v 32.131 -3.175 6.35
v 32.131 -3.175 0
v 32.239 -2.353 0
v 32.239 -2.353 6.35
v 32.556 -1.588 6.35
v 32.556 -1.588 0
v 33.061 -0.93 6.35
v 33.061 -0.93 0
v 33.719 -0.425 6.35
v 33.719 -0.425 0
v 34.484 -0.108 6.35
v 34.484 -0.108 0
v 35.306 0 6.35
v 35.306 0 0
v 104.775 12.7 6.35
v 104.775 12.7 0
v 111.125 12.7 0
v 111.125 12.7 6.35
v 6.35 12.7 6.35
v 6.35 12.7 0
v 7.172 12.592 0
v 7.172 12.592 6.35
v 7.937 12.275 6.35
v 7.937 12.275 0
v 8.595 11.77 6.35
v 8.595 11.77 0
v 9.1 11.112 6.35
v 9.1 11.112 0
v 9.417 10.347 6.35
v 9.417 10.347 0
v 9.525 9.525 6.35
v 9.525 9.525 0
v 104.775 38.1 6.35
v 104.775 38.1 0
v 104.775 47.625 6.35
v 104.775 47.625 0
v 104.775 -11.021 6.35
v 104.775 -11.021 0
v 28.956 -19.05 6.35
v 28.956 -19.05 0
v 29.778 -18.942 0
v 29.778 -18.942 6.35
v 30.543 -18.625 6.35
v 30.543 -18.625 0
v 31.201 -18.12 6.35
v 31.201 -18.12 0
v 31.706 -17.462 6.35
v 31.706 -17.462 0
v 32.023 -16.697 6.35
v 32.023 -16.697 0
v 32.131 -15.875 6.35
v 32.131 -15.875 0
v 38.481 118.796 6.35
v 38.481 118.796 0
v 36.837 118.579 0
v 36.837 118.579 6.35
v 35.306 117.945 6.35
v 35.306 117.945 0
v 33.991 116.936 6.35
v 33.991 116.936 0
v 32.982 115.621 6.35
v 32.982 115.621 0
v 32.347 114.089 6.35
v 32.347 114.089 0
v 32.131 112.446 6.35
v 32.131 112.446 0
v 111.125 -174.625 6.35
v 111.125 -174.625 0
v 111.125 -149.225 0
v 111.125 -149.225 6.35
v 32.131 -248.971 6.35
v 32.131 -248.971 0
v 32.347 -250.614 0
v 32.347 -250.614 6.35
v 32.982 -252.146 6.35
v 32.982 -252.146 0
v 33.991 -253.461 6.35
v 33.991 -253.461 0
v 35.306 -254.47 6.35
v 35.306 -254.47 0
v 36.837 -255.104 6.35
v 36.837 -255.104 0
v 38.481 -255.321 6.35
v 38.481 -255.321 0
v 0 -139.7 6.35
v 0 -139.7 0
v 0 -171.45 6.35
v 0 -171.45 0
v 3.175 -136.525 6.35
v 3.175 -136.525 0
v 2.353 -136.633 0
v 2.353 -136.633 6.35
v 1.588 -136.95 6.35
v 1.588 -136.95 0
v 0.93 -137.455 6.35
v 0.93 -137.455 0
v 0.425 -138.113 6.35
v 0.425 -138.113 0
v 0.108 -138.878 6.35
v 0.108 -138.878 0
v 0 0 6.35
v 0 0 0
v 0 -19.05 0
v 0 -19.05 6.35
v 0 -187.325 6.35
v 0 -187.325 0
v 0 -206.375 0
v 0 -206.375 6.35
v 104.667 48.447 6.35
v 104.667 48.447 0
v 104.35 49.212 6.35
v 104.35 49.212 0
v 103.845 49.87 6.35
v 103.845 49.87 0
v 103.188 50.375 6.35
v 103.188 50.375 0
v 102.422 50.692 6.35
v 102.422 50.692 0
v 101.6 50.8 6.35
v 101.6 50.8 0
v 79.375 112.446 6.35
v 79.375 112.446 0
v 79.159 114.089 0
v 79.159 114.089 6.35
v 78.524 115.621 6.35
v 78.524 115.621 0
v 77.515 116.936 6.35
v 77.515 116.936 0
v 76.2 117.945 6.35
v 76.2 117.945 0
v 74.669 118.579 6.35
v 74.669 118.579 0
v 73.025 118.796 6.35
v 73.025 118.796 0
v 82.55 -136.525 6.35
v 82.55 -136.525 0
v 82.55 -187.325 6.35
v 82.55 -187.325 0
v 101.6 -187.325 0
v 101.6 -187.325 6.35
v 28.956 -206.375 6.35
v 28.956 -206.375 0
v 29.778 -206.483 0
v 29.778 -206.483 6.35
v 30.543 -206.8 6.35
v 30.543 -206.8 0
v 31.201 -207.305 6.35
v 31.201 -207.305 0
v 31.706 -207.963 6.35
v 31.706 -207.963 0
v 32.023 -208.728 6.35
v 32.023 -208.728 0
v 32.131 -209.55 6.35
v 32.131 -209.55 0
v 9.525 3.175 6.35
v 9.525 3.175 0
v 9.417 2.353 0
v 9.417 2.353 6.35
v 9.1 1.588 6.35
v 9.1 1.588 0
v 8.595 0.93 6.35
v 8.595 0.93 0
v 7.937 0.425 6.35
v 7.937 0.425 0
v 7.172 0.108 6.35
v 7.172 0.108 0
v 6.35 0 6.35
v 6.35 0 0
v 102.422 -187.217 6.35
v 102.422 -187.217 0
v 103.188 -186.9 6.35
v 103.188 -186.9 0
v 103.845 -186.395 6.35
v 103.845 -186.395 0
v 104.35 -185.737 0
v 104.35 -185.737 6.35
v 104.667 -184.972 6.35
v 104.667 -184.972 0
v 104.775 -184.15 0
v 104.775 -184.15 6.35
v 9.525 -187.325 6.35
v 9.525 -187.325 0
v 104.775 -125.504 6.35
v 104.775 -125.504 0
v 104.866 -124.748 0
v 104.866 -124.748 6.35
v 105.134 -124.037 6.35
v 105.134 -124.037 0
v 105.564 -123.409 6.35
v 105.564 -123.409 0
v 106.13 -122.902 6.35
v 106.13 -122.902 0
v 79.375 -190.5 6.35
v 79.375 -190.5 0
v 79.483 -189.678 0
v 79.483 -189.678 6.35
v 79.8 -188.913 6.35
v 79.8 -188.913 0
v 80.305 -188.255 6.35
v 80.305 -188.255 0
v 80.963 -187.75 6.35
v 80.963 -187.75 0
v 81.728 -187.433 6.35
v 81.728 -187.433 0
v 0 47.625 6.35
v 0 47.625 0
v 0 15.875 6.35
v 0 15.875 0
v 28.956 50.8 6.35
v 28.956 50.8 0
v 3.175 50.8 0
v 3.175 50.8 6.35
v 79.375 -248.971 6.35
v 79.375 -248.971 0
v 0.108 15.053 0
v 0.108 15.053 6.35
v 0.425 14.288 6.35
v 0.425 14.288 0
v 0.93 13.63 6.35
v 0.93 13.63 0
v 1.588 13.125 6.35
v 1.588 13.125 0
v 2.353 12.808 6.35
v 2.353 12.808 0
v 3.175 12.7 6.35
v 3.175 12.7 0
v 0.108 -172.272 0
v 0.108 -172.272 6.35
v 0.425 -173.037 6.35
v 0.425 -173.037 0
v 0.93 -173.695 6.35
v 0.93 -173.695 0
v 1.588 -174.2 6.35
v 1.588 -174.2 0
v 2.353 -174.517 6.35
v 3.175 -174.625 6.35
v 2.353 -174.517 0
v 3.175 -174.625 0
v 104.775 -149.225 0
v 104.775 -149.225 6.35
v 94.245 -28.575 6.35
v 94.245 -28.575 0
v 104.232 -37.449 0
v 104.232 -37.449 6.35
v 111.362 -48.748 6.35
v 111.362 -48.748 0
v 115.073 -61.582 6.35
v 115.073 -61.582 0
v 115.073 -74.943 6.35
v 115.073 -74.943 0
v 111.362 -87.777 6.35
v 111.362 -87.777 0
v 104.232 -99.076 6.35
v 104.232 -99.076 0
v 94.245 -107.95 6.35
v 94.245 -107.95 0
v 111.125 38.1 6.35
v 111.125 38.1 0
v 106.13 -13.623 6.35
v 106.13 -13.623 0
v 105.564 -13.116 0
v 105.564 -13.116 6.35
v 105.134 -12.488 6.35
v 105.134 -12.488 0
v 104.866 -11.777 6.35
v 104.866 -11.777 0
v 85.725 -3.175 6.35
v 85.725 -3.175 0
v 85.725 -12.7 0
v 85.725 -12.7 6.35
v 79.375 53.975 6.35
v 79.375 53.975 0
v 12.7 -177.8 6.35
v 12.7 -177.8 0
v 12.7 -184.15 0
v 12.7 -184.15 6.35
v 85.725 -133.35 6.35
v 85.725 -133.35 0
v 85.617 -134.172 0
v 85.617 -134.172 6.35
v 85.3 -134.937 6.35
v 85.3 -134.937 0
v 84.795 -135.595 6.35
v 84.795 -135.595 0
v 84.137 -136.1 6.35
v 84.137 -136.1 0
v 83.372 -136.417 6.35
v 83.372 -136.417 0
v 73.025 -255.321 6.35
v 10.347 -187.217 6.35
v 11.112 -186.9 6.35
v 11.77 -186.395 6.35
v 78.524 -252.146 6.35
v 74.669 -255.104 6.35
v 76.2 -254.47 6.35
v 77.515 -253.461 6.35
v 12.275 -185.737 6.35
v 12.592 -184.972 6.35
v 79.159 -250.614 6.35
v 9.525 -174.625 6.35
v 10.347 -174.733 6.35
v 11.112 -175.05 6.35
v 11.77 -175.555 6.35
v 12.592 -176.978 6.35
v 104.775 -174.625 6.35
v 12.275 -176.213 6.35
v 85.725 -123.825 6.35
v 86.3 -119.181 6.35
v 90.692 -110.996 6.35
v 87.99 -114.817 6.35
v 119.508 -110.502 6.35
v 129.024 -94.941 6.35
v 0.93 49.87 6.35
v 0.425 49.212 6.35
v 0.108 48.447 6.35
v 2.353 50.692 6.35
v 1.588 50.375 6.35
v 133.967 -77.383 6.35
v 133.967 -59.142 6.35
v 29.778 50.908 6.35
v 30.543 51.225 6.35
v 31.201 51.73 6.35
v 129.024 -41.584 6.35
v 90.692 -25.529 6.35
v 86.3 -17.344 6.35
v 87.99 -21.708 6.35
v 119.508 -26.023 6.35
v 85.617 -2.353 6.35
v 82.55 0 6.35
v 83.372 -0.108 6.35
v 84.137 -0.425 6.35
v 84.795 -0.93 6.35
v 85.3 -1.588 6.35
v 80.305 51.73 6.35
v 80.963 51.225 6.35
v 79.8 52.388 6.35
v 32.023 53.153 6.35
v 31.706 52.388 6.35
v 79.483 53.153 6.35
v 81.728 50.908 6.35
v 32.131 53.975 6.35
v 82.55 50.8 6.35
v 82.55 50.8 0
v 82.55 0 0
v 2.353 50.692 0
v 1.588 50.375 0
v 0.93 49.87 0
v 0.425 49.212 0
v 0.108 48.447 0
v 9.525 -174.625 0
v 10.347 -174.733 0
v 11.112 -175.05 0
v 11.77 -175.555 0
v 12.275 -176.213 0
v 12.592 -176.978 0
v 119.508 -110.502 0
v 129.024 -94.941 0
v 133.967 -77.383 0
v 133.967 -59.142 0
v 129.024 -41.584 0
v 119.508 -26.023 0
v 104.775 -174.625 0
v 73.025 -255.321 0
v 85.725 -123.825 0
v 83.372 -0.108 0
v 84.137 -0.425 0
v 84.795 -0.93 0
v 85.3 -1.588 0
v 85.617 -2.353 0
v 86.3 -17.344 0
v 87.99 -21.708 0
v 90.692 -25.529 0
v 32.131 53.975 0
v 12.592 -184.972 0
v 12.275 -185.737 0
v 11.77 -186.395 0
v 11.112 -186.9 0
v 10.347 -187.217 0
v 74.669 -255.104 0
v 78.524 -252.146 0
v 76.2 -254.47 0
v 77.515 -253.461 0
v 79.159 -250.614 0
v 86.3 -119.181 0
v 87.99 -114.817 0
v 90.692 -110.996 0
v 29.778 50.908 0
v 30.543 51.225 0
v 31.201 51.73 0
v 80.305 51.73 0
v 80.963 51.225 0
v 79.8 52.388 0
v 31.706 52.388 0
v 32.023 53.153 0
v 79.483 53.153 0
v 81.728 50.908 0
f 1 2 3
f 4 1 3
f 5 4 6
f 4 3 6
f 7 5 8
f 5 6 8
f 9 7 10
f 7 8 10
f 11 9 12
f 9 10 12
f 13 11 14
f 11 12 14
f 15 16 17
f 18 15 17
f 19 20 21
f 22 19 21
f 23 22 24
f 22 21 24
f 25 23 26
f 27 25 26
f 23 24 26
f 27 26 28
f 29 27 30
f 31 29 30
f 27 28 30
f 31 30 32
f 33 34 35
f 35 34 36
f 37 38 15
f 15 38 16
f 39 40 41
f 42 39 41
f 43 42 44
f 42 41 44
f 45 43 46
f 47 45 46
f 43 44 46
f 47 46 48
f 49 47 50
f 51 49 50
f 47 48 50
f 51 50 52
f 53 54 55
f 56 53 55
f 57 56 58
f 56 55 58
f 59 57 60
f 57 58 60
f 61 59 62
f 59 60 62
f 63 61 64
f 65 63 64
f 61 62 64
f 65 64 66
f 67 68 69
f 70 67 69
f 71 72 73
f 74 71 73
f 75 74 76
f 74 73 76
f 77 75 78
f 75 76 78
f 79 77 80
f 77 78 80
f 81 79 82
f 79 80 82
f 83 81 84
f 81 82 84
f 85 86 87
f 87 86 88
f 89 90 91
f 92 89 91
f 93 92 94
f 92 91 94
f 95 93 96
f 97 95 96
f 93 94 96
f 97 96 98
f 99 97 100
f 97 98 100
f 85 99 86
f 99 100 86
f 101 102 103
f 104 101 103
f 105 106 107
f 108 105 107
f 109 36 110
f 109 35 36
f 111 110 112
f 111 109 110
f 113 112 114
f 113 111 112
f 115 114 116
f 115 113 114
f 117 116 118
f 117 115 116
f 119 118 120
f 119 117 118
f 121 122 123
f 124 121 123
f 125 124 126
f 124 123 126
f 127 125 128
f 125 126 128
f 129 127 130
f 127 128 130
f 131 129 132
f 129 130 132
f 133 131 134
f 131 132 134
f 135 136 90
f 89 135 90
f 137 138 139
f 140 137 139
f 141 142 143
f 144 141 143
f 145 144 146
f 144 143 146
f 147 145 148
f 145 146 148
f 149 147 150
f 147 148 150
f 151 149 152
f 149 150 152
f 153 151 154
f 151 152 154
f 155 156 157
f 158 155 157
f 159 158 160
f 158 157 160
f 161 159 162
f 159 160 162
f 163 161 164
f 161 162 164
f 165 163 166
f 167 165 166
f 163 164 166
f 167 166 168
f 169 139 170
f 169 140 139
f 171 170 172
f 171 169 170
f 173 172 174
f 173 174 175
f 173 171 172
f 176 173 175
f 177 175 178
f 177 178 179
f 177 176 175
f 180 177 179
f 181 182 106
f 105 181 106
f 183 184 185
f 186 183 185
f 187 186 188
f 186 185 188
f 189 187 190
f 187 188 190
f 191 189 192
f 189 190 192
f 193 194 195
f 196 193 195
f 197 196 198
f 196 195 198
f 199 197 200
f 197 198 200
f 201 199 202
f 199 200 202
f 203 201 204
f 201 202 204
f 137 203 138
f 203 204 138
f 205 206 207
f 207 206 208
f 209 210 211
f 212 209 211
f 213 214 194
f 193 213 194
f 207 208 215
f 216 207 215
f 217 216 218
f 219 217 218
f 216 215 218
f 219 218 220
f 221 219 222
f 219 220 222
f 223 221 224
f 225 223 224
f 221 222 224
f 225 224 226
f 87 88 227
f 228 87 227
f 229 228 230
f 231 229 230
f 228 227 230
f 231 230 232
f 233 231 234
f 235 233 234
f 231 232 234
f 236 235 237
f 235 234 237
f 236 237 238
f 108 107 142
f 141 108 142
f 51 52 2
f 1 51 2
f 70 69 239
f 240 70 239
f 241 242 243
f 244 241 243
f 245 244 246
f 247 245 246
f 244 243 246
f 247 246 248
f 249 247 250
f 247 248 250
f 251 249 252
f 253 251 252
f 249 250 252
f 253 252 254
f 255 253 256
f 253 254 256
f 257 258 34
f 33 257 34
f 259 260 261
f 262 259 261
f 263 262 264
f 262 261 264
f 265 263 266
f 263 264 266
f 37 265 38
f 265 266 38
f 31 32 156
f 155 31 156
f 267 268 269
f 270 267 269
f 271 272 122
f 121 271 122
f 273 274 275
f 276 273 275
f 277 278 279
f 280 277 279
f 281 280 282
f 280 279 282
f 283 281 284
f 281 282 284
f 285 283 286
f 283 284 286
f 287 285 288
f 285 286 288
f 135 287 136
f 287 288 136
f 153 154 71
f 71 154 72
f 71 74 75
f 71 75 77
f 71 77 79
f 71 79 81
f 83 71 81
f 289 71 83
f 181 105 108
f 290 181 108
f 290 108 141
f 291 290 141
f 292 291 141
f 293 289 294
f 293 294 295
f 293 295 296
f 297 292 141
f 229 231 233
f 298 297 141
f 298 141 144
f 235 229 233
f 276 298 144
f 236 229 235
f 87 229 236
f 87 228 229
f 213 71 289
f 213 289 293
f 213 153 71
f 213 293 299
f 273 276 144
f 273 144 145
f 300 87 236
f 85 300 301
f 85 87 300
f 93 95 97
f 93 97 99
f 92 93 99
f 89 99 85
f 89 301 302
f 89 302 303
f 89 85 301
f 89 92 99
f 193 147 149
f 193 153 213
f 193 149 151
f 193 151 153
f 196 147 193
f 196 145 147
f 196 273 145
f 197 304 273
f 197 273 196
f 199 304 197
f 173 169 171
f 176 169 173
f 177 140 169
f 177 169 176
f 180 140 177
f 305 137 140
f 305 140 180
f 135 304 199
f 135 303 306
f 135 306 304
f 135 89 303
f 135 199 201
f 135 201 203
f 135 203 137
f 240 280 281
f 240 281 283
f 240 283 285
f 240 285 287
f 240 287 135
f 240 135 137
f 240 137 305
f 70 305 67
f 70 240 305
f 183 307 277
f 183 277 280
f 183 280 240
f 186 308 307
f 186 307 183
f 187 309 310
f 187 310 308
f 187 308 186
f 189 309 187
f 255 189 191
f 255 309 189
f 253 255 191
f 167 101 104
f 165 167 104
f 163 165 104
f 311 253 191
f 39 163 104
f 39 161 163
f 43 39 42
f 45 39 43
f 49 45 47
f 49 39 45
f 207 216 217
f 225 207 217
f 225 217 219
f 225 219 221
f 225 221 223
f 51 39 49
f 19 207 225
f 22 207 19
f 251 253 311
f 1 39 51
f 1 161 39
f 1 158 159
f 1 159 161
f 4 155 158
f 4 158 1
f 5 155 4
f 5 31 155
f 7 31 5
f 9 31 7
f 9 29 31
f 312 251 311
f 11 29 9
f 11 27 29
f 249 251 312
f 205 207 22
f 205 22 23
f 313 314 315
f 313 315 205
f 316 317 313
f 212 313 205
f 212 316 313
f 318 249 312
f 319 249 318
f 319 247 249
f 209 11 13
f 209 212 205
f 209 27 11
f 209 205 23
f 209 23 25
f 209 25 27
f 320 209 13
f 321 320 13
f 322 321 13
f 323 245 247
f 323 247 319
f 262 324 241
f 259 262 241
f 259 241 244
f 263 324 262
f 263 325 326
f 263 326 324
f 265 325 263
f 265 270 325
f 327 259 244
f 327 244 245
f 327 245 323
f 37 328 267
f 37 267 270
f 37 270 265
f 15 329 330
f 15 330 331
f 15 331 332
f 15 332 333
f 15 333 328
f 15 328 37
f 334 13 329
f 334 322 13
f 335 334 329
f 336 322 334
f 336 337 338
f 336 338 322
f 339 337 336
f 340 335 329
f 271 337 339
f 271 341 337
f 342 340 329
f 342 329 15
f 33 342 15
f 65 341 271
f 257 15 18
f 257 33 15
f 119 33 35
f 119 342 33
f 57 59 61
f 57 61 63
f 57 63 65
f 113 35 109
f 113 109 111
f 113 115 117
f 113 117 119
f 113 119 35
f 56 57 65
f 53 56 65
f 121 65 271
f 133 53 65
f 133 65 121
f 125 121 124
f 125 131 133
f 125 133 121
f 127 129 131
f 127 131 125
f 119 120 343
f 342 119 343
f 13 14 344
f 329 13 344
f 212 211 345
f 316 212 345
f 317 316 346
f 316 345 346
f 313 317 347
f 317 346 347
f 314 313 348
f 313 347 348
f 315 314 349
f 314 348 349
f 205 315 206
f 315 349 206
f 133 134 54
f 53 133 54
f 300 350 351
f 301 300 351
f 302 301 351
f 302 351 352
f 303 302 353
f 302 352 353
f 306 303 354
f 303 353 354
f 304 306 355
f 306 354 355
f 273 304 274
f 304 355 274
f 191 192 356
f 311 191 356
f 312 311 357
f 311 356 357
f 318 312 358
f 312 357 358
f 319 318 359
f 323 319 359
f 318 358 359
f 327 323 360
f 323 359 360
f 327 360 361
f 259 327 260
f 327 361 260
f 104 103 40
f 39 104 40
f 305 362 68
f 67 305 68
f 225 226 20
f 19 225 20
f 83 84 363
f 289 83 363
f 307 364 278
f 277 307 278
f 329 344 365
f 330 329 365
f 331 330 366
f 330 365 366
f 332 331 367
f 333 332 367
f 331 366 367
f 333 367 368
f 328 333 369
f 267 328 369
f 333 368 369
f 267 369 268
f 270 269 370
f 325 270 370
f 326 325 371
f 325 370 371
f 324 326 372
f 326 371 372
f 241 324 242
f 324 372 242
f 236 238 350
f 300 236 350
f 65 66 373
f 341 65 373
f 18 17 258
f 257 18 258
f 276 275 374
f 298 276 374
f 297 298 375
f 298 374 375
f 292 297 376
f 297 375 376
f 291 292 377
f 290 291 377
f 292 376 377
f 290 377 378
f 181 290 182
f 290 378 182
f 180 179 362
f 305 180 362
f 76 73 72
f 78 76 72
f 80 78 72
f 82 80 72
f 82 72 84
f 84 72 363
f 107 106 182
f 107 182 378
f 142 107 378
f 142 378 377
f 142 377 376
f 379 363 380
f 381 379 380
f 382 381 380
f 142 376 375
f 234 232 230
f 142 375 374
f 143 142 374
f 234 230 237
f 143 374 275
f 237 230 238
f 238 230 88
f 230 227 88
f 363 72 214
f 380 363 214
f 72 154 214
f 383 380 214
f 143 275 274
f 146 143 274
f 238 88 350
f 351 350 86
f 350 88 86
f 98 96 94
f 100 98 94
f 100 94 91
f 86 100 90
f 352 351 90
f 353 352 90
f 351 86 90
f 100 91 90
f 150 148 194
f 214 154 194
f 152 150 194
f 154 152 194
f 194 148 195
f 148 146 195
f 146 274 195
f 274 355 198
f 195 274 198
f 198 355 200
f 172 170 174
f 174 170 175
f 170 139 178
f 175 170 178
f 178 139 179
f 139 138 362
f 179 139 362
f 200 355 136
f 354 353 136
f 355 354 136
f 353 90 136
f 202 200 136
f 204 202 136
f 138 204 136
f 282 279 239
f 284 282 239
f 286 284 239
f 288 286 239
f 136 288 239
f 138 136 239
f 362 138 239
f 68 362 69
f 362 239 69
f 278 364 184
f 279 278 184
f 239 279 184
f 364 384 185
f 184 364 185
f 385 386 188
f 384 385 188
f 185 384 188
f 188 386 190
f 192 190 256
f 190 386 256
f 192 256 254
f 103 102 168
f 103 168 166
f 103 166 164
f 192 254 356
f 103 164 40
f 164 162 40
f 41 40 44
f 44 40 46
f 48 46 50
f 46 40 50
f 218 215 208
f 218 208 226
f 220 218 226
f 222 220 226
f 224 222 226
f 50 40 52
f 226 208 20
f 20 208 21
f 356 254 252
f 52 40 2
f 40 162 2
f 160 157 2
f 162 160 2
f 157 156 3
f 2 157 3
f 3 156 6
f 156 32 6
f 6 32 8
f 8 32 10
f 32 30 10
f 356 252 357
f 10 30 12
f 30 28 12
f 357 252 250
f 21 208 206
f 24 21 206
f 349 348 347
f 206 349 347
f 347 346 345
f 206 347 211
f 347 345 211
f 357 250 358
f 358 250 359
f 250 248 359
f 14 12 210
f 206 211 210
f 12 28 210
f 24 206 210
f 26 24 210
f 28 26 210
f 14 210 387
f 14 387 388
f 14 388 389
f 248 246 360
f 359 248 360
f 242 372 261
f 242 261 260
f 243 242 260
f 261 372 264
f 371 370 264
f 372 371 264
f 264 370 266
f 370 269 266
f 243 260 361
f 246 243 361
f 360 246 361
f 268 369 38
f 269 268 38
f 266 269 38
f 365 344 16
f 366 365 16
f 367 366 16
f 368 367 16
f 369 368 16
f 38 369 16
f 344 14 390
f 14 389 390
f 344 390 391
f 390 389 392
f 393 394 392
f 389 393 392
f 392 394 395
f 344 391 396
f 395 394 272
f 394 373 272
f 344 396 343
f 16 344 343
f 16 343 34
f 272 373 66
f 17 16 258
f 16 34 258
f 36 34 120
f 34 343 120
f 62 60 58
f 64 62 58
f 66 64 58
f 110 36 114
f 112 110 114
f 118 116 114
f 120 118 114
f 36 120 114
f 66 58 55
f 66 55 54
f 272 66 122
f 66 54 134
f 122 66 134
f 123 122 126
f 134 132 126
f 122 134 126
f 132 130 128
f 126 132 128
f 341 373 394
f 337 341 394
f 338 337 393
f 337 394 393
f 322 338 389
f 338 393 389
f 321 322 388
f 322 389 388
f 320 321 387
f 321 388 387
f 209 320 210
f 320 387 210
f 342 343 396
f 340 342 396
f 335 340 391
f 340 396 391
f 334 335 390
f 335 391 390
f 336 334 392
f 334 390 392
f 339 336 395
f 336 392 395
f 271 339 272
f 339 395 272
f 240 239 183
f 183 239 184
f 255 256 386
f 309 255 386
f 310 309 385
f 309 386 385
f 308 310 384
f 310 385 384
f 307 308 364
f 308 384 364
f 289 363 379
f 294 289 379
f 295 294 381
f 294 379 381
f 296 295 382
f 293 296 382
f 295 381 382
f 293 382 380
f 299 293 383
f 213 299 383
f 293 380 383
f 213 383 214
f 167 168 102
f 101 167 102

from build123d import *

# Parameters (mm, degrees)
F1_DEPTH = 6.35
F2_R     = 3.175


with BuildPart() as f1:
    # F0 (on Top) → F1 (new body)
    with BuildSketch(Plane.XY):
        with BuildLine():
            Line((6.35, 0), (0, 0))
            Line((0, 0), (0, -19.05))
            Line((0, -19.05), (28.956, -19.05))
            ThreePointArc((28.956, -19.05), (31.201064, -18.120064), (32.131, -15.875))
            Line((32.131, -15.875), (32.131, -3.175))
            ThreePointArc((32.131, -3.175), (33.060936, -0.929936), (35.306, 0))
            Line((35.306, 0), (82.55, 0))
            ThreePointArc((82.55, 0), (84.795064, -0.929936), (85.725, -3.175))
            Line((85.725, -3.175), (85.725, -12.7))
            ThreePointArc((85.725, -12.7), (87.989524, -21.708346), (94.244716, -28.575))
            ThreePointArc((94.244716, -28.575), (115.544007, -68.2625), (94.244716, -107.95))
            ThreePointArc((94.244716, -107.95), (87.989524, -114.816654), (85.725, -123.825))
            Line((85.725, -123.825), (85.725, -133.35))
            ThreePointArc((85.725, -133.35), (84.795064, -135.595064), (82.55, -136.525))
            Line((82.55, -136.525), (3.175, -136.525))
            ThreePointArc((3.175, -136.525), (0.929936, -137.454936), (0, -139.7))
            Line((0, -139.7), (0, -171.45))
            ThreePointArc((0, -171.45), (0.929936, -173.695064), (3.175, -174.625))
            Line((3.175, -174.625), (9.525, -174.625))
            ThreePointArc((9.525, -174.625), (11.770064, -175.554936), (12.7, -177.8))
            Line((12.7, -177.8), (12.7, -184.15))
            ThreePointArc((12.7, -184.15), (11.770064, -186.395064), (9.525, -187.325))
            Line((9.525, -187.325), (0, -187.325))
            Line((0, -187.325), (0, -206.375))
            Line((0, -206.375), (28.956, -206.375))
            ThreePointArc((28.956, -206.375), (31.201064, -207.304936), (32.131, -209.55))
            Line((32.131, -209.55), (32.131, -248.9708))
            ThreePointArc((32.131, -248.9708), (33.990872, -253.460928), (38.481, -255.3208))
            Line((38.481, -255.3208), (73.025, -255.3208))
            ThreePointArc((73.025, -255.3208), (77.515128, -253.460928), (79.375, -248.9708))
            Line((79.375, -248.9708), (79.375, -190.5))
            ThreePointArc((79.375, -190.5), (80.304936, -188.254936), (82.55, -187.325))
            Line((82.55, -187.325), (104.775, -187.325))
            Line((104.775, -187.325), (104.775, -174.625))
            Line((104.775, -174.625), (111.125, -174.625))
            Line((111.125, -174.625), (111.125, -149.225))
            Line((111.125, -149.225), (104.775, -149.225))
            Line((104.775, -149.225), (104.775, -125.503588))
            ThreePointArc((104.775, -125.503588), (105.134168, -124.036716), (106.130409, -122.90172))
            ThreePointArc((106.130409, -122.90172), (134.594007, -68.2625), (106.130409, -13.62328))
            ThreePointArc((106.130409, -13.62328), (105.134168, -12.488284), (104.775, -11.021412))
            Line((104.775, -11.021412), (104.775, 12.7))
            Line((104.775, 12.7), (111.125, 12.7))
            Line((111.125, 12.7), (111.125, 38.1))
            Line((111.125, 38.1), (104.775, 38.1))
            Line((104.775, 38.1), (104.775, 50.8))
            Line((104.775, 50.8), (82.55, 50.8))
            ThreePointArc((82.55, 50.8), (80.304936, 51.729936), (79.375, 53.975))
            Line((79.375, 53.975), (79.375, 112.4458))
            ThreePointArc((79.375, 112.4458), (77.515128, 116.935928), (73.025, 118.7958))
            Line((73.025, 118.7958), (38.481, 118.7958))
            ThreePointArc((38.481, 118.7958), (33.990872, 116.935928), (32.131, 112.4458))
            Line((32.131, 112.4458), (32.131, 53.975))
            ThreePointArc((32.131, 53.975), (31.201064, 51.729936), (28.956, 50.8))
            Line((28.956, 50.8), (3.175, 50.8))
            ThreePointArc((3.175, 50.8), (0.929936, 49.870064), (0, 47.625))
            Line((0, 47.625), (0, 15.875))
            ThreePointArc((0, 15.875), (0.929936, 13.629936), (3.175, 12.7))
            Line((3.175, 12.7), (6.35, 12.7))
            ThreePointArc((6.35, 12.7), (8.595064, 11.770064), (9.525, 9.525))
            Line((9.525, 9.525), (9.525, 3.175))
            ThreePointArc((9.525, 3.175), (8.595064, 0.929936), (6.35, 0))
        make_face()
    extrude(amount=F1_DEPTH)

    # F2
    f2_edges = [f1.edges().sort_by_distance(p)[0] for p in [
        (104.775, -187.325, 3.175),
        (104.775, 50.8, 3.175),
    ]]
    fillet(f2_edges, radius=F2_R)


solid = f1.part
